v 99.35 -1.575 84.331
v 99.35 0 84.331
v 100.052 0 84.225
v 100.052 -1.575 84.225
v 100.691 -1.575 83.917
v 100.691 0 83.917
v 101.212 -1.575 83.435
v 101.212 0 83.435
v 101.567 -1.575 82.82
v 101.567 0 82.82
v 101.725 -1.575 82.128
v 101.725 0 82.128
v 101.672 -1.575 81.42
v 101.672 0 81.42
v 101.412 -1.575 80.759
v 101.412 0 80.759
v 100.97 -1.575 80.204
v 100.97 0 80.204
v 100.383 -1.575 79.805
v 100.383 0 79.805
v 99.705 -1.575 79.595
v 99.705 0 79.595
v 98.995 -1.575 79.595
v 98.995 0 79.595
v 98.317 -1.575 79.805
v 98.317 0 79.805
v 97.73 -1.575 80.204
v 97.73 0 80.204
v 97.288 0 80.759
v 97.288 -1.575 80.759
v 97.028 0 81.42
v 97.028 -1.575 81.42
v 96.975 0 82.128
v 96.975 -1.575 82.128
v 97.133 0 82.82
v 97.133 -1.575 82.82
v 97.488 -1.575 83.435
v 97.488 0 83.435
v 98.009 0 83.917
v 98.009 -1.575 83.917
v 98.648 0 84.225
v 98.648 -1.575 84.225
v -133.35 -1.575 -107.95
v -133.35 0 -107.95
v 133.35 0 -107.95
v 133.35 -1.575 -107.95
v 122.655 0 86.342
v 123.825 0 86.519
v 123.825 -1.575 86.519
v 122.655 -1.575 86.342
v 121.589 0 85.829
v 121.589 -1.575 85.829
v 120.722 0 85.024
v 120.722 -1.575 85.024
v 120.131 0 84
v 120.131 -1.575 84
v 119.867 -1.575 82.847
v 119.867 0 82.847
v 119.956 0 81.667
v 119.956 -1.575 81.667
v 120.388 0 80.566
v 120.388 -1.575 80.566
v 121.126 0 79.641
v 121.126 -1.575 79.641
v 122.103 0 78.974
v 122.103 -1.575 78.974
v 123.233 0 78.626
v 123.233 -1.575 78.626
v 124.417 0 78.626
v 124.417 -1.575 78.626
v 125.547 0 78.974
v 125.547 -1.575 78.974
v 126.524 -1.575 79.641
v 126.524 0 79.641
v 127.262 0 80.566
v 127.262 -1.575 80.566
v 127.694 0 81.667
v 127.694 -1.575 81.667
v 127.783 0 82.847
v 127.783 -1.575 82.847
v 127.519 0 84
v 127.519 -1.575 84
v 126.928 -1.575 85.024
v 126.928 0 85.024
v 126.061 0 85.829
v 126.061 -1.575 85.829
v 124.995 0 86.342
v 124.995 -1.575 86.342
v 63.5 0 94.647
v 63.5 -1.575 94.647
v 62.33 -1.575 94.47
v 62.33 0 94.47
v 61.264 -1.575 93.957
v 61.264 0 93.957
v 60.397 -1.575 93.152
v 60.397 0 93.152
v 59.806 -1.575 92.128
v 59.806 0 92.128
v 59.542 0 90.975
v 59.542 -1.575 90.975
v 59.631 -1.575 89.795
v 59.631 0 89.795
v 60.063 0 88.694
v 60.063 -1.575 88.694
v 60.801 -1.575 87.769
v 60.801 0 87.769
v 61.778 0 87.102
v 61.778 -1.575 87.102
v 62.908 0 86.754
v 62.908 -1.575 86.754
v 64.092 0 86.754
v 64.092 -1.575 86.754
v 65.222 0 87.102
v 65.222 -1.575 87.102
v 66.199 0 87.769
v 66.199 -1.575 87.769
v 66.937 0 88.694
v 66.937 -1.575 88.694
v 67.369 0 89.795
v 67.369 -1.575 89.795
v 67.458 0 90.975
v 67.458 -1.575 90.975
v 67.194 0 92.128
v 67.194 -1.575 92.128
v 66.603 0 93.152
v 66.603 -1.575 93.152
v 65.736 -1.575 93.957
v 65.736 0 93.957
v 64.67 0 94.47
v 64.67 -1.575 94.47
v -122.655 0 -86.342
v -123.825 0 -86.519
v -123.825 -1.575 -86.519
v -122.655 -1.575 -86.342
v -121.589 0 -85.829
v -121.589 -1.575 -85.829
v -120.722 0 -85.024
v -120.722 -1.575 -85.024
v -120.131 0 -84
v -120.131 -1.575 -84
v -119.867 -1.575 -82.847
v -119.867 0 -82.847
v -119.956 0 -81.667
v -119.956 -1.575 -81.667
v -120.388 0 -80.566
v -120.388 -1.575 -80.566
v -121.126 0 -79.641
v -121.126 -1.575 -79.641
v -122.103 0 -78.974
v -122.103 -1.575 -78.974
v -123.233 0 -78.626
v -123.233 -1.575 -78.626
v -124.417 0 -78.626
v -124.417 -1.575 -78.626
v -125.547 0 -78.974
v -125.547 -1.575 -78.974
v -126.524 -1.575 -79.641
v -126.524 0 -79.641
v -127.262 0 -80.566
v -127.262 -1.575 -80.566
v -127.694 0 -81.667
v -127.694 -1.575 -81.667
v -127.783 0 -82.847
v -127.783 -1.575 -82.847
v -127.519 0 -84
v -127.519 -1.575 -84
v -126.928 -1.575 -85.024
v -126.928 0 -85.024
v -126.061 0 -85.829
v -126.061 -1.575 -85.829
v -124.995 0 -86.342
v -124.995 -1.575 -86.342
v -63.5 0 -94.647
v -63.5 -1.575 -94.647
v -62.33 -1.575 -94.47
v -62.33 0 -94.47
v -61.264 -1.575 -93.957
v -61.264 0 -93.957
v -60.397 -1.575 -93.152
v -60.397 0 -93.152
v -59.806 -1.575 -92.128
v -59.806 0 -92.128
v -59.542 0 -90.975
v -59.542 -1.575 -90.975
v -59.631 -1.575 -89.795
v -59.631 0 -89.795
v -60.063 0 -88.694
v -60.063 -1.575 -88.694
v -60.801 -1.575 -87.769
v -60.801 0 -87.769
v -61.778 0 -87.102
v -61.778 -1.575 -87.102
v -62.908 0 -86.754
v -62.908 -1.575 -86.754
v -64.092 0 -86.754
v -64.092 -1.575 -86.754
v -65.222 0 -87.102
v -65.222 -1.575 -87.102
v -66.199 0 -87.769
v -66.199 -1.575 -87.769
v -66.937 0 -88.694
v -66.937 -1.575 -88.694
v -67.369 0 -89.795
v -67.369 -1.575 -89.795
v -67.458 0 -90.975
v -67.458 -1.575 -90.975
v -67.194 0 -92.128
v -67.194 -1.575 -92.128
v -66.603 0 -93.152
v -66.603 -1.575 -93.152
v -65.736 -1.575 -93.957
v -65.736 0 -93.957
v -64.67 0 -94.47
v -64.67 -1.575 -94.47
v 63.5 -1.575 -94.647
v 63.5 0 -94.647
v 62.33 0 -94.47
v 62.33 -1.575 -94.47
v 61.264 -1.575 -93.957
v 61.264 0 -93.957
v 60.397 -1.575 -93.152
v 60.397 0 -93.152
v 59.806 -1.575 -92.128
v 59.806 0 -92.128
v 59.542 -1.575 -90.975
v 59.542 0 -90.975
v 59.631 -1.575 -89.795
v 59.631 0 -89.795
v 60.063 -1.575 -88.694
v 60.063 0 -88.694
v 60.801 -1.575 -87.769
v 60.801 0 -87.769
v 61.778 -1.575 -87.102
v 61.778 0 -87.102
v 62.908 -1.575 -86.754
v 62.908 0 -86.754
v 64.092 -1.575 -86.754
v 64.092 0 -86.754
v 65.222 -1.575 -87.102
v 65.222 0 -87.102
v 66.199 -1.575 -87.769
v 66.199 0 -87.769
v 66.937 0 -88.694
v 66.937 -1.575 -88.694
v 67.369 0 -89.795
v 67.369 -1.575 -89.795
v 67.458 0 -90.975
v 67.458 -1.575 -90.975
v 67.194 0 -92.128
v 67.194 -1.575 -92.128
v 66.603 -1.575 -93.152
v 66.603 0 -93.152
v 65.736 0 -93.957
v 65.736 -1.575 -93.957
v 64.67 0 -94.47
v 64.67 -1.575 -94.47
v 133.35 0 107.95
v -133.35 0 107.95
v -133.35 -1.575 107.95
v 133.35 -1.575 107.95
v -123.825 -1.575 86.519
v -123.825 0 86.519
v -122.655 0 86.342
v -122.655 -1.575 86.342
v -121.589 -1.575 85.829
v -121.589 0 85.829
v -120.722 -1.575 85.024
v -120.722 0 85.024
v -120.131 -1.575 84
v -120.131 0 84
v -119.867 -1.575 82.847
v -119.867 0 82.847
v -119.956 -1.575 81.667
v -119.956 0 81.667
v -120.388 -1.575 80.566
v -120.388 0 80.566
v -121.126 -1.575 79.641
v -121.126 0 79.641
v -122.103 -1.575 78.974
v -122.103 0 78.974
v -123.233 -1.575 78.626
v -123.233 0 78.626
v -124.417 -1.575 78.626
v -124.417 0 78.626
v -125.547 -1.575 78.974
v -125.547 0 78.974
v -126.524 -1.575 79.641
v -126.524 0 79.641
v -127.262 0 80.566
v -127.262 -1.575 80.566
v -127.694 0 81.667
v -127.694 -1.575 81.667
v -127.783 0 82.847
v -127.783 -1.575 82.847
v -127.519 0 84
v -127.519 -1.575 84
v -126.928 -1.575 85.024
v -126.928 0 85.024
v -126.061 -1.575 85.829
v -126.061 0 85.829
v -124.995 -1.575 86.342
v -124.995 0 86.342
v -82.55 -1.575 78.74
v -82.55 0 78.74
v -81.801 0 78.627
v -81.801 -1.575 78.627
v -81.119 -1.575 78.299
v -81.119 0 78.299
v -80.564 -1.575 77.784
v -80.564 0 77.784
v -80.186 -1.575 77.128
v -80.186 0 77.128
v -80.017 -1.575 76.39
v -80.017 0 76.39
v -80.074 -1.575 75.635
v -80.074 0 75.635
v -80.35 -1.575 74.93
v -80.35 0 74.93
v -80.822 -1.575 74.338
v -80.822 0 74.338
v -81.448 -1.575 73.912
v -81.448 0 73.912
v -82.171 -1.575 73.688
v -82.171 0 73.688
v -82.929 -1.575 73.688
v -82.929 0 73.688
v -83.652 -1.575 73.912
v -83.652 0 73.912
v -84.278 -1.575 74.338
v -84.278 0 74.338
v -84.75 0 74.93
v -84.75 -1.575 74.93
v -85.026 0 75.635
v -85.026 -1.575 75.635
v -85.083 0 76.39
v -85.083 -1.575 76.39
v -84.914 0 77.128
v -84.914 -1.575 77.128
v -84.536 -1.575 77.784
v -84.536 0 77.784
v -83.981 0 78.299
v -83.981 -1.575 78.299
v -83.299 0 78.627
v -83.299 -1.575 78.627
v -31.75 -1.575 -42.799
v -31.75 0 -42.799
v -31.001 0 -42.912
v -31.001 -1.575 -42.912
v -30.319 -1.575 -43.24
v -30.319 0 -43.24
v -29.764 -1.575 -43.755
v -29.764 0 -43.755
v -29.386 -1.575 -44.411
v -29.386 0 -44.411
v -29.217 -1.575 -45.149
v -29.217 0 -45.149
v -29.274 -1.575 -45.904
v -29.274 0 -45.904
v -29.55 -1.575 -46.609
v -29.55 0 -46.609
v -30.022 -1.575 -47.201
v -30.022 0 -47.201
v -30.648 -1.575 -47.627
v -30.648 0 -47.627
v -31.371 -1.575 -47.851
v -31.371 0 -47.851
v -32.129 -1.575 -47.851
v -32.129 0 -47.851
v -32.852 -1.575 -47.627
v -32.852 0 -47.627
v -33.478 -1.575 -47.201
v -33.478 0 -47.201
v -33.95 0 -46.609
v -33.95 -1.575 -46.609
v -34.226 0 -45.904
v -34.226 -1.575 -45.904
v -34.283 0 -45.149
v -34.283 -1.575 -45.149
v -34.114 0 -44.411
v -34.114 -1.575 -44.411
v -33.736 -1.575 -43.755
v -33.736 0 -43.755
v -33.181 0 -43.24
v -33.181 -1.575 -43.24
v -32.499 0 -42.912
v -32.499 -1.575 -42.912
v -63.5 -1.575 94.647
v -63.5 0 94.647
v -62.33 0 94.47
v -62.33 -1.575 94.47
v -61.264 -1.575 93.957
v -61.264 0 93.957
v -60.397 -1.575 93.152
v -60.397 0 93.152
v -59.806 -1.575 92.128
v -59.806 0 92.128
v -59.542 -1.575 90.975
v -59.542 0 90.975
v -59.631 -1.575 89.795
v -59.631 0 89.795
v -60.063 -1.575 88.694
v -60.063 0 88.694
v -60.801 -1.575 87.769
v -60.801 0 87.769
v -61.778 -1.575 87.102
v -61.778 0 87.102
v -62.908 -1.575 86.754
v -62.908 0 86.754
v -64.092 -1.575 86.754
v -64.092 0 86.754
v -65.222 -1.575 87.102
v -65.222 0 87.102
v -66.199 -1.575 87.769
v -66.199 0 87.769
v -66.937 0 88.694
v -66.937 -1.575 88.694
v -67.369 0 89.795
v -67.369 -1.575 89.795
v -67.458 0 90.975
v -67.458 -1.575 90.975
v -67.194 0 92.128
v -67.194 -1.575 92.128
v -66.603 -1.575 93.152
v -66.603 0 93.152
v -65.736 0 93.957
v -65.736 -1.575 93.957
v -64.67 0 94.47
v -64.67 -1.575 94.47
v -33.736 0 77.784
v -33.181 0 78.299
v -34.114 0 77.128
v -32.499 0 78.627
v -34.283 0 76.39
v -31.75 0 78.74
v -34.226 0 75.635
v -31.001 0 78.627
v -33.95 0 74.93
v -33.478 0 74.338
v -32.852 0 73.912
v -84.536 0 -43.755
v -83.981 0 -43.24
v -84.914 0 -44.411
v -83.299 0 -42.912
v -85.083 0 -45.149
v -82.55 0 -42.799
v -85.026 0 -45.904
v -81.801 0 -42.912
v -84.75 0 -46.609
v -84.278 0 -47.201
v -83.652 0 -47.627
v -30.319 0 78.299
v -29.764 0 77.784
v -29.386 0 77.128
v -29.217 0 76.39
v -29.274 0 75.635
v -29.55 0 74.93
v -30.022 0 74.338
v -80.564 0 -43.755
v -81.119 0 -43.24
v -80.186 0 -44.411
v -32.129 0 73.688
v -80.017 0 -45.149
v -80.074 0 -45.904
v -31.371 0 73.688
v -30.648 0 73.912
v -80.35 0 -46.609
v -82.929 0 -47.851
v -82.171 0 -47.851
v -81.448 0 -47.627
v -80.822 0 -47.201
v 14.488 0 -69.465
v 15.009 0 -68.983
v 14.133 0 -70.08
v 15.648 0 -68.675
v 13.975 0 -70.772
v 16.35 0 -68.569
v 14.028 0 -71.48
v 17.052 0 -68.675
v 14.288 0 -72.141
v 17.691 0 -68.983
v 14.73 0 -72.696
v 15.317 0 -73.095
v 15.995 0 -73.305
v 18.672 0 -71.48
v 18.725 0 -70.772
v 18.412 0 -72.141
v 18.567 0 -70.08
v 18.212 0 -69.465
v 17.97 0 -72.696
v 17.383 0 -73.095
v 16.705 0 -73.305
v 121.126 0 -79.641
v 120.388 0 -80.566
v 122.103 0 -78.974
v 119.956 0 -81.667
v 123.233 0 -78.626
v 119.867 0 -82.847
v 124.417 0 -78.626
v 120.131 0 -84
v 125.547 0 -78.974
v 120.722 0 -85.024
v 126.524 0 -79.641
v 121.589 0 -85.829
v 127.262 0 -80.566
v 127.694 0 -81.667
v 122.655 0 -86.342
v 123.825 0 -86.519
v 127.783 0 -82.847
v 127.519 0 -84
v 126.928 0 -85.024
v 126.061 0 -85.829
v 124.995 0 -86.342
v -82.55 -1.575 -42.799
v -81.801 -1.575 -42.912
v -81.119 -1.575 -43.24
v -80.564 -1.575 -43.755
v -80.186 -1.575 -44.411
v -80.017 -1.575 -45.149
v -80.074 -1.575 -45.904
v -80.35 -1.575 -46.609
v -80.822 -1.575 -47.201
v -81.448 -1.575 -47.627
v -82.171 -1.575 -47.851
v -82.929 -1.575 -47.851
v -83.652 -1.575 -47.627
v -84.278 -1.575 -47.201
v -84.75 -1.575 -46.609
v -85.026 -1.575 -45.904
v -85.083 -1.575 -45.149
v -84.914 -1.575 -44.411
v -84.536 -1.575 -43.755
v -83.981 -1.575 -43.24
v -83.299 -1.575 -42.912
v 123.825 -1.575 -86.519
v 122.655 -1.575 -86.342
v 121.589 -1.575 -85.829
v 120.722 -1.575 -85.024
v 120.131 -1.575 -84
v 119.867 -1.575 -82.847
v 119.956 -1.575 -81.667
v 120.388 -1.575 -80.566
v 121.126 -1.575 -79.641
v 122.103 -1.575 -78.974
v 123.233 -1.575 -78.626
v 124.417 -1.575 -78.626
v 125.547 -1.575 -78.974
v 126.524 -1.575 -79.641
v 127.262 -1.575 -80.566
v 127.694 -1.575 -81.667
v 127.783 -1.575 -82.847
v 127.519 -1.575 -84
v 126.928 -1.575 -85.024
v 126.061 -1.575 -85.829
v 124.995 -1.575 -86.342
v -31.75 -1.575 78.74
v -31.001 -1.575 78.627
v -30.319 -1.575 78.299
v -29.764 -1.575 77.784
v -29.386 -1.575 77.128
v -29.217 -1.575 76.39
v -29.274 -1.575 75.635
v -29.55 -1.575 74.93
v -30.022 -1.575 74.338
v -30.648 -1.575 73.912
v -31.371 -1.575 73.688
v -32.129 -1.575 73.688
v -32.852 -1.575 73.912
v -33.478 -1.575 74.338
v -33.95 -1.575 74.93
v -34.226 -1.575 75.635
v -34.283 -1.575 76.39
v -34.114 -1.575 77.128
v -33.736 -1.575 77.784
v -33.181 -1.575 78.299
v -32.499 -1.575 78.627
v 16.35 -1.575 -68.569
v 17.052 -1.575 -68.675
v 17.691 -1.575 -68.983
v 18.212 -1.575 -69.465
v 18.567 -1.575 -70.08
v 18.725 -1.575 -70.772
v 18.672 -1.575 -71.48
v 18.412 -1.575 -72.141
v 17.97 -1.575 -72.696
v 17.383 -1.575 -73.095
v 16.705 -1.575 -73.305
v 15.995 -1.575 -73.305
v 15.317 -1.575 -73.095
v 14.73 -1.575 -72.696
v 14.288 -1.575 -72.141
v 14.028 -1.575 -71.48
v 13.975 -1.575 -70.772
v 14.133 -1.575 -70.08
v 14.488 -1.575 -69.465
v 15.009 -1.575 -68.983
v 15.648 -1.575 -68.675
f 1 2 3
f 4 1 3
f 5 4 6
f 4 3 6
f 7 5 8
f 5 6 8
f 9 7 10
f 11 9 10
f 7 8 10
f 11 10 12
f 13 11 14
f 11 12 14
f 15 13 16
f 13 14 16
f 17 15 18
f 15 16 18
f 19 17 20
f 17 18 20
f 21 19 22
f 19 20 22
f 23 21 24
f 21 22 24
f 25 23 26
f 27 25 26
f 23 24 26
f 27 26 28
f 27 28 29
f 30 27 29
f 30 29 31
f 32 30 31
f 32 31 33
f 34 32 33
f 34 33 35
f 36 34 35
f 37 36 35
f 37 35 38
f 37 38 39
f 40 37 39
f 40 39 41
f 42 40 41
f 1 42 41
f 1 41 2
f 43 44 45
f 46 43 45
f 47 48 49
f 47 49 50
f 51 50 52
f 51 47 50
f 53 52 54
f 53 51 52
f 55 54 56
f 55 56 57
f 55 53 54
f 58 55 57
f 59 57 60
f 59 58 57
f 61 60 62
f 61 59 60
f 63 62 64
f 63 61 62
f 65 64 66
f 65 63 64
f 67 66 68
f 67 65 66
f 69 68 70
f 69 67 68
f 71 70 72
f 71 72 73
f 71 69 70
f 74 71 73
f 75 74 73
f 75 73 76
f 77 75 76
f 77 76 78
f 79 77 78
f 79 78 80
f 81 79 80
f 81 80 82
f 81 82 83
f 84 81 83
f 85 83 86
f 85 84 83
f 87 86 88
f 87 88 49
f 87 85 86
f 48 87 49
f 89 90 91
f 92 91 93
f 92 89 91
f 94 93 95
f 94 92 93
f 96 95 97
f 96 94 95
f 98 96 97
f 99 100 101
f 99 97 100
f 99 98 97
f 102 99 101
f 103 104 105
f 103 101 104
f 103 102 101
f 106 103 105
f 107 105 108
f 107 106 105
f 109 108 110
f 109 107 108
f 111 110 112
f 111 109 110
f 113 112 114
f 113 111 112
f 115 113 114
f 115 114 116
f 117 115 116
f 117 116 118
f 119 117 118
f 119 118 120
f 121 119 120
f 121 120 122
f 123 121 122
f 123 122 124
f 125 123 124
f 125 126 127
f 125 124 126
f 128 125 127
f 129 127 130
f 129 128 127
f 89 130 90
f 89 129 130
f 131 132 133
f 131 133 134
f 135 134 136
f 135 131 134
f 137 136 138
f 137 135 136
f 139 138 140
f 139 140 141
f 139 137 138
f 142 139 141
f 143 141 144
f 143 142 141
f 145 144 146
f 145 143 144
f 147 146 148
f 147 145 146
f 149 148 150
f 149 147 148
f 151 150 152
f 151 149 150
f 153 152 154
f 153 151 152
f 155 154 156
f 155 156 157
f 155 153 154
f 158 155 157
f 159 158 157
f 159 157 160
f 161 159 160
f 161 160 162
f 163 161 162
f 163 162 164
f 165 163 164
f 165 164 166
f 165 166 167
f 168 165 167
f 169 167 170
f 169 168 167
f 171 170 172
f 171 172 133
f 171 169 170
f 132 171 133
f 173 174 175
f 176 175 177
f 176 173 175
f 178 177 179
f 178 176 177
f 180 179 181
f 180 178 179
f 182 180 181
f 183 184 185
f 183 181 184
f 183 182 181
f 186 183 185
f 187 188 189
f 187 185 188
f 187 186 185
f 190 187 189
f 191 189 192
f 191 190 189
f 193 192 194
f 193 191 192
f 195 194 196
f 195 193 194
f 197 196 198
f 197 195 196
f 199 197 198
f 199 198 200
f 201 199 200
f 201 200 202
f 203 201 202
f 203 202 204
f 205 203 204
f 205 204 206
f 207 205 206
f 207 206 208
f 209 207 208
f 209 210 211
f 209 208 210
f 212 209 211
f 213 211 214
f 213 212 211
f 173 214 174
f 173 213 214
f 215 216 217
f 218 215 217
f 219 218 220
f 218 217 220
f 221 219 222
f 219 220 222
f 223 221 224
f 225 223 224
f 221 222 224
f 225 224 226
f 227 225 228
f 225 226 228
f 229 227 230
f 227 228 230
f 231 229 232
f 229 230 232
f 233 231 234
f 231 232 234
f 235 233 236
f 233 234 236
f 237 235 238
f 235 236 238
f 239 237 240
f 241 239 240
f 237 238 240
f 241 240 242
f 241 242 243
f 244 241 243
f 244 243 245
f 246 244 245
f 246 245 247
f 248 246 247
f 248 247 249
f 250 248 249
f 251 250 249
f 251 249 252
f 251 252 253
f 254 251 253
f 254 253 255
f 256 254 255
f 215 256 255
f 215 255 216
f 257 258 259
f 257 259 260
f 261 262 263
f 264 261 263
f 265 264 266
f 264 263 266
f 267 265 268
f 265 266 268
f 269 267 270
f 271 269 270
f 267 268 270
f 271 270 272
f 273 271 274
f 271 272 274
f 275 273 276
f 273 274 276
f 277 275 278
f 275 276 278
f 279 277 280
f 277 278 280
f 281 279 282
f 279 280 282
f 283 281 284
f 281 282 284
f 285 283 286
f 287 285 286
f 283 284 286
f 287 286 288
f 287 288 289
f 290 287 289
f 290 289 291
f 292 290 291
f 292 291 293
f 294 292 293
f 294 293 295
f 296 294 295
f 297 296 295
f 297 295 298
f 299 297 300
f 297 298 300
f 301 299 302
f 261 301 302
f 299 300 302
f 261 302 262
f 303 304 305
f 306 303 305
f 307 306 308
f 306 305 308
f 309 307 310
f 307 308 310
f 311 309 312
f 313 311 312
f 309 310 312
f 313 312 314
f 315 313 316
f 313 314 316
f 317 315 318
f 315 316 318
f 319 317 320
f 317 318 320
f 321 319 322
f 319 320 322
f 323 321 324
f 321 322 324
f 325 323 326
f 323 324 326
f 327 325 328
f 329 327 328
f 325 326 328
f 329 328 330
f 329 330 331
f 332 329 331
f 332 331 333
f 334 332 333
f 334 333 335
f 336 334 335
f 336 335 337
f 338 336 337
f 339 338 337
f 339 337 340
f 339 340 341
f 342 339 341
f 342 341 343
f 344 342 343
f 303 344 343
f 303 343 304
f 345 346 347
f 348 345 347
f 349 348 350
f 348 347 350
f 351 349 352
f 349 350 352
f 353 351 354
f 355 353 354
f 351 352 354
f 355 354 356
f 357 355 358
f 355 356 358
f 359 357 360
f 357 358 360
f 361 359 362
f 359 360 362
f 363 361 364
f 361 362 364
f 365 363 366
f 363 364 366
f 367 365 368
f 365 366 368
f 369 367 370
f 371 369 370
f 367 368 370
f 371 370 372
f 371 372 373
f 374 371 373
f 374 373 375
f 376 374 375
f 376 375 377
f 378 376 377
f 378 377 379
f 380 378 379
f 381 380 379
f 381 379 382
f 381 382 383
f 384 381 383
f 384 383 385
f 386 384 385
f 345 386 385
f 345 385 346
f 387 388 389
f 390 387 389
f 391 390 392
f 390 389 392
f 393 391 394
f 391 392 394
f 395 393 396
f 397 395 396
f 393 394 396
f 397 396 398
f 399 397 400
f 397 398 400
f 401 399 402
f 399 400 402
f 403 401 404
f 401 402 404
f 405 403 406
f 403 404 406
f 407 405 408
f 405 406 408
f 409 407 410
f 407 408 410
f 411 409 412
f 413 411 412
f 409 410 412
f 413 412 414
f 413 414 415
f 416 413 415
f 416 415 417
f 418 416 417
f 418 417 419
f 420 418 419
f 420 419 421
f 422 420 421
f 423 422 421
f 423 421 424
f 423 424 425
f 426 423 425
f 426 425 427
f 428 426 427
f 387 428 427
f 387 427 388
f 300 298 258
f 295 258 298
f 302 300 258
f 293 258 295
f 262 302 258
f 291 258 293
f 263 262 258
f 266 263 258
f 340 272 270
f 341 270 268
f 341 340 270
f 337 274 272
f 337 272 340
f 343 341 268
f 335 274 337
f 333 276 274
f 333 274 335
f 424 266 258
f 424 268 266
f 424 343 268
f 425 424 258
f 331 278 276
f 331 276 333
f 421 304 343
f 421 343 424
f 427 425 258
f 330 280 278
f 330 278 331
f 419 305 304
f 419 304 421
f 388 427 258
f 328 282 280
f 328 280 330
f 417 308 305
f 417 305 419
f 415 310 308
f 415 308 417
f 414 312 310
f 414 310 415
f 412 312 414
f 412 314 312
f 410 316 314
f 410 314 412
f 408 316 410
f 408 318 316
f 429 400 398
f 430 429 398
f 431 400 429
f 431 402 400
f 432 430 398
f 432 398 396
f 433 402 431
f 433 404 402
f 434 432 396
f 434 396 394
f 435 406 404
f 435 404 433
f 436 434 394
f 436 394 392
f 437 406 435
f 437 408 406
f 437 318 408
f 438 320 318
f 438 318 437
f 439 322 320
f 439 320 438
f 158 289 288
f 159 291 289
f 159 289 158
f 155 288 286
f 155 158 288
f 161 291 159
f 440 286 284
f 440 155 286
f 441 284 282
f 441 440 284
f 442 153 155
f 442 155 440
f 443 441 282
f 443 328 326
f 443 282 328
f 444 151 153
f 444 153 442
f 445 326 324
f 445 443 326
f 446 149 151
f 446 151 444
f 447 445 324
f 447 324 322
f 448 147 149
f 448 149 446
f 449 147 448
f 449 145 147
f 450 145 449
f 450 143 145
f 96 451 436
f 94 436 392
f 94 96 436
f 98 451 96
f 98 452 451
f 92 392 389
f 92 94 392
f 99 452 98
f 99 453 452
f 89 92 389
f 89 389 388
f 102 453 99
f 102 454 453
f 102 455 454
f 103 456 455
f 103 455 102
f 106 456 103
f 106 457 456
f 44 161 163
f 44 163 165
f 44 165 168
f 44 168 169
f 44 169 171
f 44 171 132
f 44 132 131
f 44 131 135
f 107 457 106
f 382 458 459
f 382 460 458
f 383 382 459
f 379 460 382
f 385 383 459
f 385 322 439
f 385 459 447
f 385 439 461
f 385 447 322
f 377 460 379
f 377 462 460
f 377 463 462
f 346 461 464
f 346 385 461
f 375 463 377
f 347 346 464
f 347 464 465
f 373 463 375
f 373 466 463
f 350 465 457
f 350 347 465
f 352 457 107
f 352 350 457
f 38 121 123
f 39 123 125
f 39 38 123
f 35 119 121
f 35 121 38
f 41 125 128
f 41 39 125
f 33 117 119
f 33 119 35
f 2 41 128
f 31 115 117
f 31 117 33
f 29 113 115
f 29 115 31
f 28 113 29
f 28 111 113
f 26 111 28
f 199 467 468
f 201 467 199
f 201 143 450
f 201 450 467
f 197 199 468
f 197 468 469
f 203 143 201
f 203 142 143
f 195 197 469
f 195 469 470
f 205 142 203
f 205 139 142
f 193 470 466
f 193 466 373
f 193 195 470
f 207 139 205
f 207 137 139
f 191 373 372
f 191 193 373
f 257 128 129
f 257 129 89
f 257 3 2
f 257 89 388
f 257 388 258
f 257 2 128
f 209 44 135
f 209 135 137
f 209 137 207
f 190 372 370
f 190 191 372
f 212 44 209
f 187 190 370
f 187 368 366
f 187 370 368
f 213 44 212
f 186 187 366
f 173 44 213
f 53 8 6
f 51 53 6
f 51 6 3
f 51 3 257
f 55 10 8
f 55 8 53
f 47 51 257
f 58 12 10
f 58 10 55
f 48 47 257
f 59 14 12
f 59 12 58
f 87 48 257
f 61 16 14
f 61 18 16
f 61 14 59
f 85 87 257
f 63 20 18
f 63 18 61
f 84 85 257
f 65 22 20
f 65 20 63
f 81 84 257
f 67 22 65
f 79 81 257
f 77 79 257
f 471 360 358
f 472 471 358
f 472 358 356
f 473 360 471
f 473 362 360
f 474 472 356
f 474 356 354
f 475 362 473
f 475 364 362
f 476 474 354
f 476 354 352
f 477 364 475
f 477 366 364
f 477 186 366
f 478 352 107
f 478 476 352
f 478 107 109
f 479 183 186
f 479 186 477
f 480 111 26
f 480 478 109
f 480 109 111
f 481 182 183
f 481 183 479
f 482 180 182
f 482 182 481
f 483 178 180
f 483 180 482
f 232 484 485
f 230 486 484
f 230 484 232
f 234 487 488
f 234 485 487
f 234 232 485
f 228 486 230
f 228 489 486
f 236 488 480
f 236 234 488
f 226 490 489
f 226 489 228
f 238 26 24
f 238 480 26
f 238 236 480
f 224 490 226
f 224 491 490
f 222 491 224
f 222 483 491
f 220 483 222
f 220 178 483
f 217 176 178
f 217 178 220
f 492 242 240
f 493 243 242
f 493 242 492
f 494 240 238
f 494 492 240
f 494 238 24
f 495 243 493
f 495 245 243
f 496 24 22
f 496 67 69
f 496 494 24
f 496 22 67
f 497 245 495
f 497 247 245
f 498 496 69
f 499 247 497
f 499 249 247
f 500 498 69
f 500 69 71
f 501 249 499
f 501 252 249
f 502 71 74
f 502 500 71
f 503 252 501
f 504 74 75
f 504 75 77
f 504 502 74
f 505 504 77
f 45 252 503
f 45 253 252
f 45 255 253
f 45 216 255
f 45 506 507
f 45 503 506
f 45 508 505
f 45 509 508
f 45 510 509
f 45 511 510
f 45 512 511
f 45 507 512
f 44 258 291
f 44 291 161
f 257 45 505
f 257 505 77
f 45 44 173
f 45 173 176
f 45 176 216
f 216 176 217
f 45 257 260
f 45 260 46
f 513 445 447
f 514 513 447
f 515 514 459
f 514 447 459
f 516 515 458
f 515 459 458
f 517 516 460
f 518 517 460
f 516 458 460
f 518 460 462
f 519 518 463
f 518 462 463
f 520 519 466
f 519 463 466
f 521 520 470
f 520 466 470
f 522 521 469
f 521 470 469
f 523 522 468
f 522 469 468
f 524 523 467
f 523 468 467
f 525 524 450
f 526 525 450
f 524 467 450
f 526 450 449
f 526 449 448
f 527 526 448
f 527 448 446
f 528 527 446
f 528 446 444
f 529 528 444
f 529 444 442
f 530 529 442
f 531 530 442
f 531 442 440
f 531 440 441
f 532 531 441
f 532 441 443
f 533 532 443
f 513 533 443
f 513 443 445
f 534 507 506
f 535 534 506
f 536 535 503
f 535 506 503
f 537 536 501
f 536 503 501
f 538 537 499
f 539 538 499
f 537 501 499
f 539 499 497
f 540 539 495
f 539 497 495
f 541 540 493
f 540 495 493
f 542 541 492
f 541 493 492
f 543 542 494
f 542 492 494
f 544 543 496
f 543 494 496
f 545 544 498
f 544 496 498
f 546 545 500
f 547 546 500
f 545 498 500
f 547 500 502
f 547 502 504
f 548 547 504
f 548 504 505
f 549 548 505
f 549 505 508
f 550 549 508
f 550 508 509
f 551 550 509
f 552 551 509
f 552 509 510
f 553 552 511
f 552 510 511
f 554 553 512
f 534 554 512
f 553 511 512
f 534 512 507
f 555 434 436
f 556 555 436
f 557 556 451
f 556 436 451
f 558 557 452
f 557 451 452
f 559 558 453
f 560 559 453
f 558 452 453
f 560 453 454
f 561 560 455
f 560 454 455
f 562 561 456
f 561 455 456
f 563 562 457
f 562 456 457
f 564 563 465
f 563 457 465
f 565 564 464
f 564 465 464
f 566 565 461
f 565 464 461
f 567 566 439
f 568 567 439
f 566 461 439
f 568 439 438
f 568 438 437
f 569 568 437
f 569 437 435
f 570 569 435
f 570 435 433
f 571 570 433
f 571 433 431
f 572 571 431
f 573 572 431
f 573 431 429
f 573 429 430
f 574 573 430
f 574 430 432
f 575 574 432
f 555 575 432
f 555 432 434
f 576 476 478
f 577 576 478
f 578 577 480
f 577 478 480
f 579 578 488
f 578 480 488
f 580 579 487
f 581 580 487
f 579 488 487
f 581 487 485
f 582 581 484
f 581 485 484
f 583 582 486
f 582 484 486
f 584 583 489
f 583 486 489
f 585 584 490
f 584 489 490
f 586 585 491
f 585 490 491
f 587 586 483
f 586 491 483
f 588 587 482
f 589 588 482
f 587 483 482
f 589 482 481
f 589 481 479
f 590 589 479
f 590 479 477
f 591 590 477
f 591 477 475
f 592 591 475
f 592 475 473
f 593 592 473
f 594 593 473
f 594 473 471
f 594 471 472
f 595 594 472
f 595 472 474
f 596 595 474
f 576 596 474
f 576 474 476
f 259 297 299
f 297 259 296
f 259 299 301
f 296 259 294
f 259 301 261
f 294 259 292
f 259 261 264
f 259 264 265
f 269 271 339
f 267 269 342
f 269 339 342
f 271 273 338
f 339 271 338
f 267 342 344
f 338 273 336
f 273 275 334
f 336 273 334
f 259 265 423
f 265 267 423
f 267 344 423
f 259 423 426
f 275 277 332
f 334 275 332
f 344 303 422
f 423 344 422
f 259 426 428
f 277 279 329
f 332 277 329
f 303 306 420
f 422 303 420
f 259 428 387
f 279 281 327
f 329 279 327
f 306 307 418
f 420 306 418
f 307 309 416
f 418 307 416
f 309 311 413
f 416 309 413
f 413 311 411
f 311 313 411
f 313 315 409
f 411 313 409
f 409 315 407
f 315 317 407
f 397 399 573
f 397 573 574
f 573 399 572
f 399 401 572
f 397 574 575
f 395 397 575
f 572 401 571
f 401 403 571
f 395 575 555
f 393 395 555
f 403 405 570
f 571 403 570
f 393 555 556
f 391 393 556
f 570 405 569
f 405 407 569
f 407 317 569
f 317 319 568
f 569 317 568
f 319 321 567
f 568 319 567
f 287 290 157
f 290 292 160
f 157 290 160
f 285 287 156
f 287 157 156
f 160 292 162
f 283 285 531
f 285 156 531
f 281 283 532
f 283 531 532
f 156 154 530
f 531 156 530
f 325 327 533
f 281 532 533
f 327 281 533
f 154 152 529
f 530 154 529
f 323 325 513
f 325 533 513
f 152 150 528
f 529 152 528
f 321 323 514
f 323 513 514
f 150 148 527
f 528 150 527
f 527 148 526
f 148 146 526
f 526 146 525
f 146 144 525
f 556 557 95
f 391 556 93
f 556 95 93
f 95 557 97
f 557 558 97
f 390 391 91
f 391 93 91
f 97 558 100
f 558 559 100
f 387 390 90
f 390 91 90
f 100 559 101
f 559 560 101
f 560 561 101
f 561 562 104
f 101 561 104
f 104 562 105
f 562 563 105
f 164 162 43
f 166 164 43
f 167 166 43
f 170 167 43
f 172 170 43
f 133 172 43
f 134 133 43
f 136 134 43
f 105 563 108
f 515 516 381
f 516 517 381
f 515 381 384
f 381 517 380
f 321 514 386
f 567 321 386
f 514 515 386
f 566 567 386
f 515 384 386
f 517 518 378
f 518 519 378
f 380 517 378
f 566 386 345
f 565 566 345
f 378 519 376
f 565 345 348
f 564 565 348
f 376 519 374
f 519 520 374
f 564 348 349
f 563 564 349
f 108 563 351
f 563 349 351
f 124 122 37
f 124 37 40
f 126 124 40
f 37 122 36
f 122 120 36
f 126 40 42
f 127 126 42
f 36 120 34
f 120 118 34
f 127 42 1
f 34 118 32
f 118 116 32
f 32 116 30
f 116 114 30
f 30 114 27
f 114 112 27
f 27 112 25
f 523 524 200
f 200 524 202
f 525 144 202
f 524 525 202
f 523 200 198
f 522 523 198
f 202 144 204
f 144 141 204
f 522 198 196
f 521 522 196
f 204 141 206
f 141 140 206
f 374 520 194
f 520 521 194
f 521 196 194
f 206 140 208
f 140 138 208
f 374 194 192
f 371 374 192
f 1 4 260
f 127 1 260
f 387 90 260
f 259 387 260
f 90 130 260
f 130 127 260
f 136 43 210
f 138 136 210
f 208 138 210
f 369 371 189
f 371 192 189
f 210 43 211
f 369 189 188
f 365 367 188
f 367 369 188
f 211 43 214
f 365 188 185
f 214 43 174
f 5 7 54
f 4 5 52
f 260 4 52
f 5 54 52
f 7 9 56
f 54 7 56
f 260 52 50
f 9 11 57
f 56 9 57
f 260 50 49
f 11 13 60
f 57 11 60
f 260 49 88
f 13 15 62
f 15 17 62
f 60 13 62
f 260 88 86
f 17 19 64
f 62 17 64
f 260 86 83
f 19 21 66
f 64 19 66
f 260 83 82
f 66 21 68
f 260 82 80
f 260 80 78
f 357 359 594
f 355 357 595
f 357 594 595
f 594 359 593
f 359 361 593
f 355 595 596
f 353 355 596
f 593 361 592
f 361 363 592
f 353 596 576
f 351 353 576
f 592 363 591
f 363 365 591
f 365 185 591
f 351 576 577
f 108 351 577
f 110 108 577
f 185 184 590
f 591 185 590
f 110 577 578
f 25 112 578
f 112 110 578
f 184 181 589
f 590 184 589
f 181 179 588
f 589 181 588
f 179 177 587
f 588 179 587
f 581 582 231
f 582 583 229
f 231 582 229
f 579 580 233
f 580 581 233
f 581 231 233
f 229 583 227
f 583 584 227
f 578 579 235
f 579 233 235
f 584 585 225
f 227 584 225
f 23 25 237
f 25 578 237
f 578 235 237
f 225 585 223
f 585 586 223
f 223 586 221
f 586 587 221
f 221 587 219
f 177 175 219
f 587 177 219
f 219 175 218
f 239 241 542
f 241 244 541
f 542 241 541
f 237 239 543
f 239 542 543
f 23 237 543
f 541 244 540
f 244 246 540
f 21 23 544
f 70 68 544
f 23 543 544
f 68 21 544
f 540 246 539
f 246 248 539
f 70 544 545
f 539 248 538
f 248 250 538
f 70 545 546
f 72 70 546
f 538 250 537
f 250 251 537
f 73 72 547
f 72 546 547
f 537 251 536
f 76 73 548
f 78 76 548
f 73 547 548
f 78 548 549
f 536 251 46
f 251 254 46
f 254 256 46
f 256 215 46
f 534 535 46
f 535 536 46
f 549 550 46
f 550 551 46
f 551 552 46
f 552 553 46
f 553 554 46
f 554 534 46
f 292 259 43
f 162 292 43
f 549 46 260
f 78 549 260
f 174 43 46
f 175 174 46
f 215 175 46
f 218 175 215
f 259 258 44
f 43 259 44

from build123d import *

# Parameters (mm, degrees)
SKETCH1_W               = 266.7
SKETCH1_H               = 215.9
BASE_FLANGE1_DEPTH      = 1.5748
SKETCH6_R               = 3.96875
CUT_EXTRUDE1_DEPTH      = 1.5748
SKETCH7_R               = 3.96875
CUT_EXTRUDE2_DEPTH      = 172.574779601
MIRROR2_COPY_1_SKETCH_R = 3.96875
MIRROR2_COPY_1_DEPTH    = 1.5748
MIRROR2_COPY_2_SKETCH_R = 3.96875
MIRROR2_COPY_2_DEPTH    = 172.574779601
SKETCH8_R               = 2.54
CUT_EXTRUDE3_DEPTH      = 172.574779601
SKETCH9_R               = 2.38125
CUT_EXTRUDE4_DEPTH      = 172.574779601


# Sheet-metal steps are written as plain solids
with BuildPart() as part:
    # Sketch1 → Base-Flange1 (new body)
    with BuildSketch(Plane(origin=(0, 0, 0), x_dir=(1, 0, 0), z_dir=(0, 1, 0))):
        Rectangle(SKETCH1_W, SKETCH1_H)
    extrude(amount=-BASE_FLANGE1_DEPTH)

    # Sketch6 → Cut-Extrude1 (cut)
    with BuildSketch(Plane(origin=(0, 0, 0), x_dir=(1, 0, 0), z_dir=(0, 1, 0))):
        with Locations(Location((-123.825, -82.55, 0), (0, 0, 270))):
            Circle(SKETCH6_R)
    cut_extrude1 = extrude(amount=-CUT_EXTRUDE1_DEPTH, mode=Mode.SUBTRACT)

    # Sketch7 → Cut-Extrude2 (cut, through all)
    with BuildSketch(Plane(origin=(0, 0, 0), x_dir=(1, 0, 0), z_dir=(0, 1, 0))):
        with Locations(Location((-63.5, -90.678, 0), (0, 0, 270))):
            Circle(SKETCH7_R)
    cut_extrude2 = extrude(amount=-CUT_EXTRUDE2_DEPTH, mode=Mode.SUBTRACT)

    # Mirror1: Cut-Extrude1, Cut-Extrude2 across plane
    add(cut_extrude1.mirror(Plane(origin=(0, 0, 0), x_dir=(0, 0, 1), z_dir=(1, 0, 0))), mode=Mode.SUBTRACT)
    add(cut_extrude2.mirror(Plane(origin=(0, 0, 0), x_dir=(0, 0, 1), z_dir=(1, 0, 0))), mode=Mode.SUBTRACT)

    # Mirror2: Cut-Extrude1, Cut-Extrude2 across plane
    add(cut_extrude1.mirror(Plane.XY), mode=Mode.SUBTRACT)
    add(cut_extrude2.mirror(Plane.XY), mode=Mode.SUBTRACT)

    # Mirror2 copy 1 sketch → Mirror2 copy 1 (cut)
    with BuildSketch(Plane(origin=(0, 0, 0), x_dir=(-1, 0, 0), z_dir=(0, 1, 0))):
        with Locations(Location((-123.825, -82.55, 0), (0, 0, 270))):
            Circle(MIRROR2_COPY_1_SKETCH_R)
    extrude(amount=-MIRROR2_COPY_1_DEPTH, mode=Mode.SUBTRACT)

    # Mirror2 copy 2 sketch → Mirror2 copy 2 (cut, through all)
    with BuildSketch(Plane(origin=(0, 0, 0), x_dir=(-1, 0, 0), z_dir=(0, 1, 0))):
        with Locations(Location((-63.5, -90.678, 0), (0, 0, 270))):
            Circle(MIRROR2_COPY_2_SKETCH_R)
    extrude(amount=-MIRROR2_COPY_2_DEPTH, mode=Mode.SUBTRACT)

    # Sketch8 → Cut-Extrude3 (cut, through all)
    with BuildSketch(Plane(origin=(0, 0, 0), x_dir=(1, 0, 0), z_dir=(0, 1, 0))):
        with Locations(Location((-82.55, -76.2, 0), (0, 0, 270))):
            Circle(SKETCH8_R)
        with Locations(Location((-31.75, -76.2, 0), (0, 0, 270))):
            Circle(SKETCH8_R)
        with Locations(Location((-82.55, 45.339, 0), (0, 0, 270))):
            Circle(SKETCH8_R)
        with Locations(Location((-31.75, 45.339, 0), (0, 0, 270))):
            Circle(SKETCH8_R)
    extrude(amount=-CUT_EXTRUDE3_DEPTH, mode=Mode.SUBTRACT)

    # Sketch9 → Cut-Extrude4 (cut, through all)
    with BuildSketch(Plane(origin=(0, 0, 0), x_dir=(1, 0, 0), z_dir=(0, 1, 0))):
        with Locations(Location((99.35, -81.95, 0), (0, 0, 270))):
            Circle(SKETCH9_R)
        with Locations(Location((16.35, 70.95, 0), (0, 0, 270))):
            Circle(SKETCH9_R)
    extrude(amount=-CUT_EXTRUDE4_DEPTH, mode=Mode.SUBTRACT)


solid = part.part
